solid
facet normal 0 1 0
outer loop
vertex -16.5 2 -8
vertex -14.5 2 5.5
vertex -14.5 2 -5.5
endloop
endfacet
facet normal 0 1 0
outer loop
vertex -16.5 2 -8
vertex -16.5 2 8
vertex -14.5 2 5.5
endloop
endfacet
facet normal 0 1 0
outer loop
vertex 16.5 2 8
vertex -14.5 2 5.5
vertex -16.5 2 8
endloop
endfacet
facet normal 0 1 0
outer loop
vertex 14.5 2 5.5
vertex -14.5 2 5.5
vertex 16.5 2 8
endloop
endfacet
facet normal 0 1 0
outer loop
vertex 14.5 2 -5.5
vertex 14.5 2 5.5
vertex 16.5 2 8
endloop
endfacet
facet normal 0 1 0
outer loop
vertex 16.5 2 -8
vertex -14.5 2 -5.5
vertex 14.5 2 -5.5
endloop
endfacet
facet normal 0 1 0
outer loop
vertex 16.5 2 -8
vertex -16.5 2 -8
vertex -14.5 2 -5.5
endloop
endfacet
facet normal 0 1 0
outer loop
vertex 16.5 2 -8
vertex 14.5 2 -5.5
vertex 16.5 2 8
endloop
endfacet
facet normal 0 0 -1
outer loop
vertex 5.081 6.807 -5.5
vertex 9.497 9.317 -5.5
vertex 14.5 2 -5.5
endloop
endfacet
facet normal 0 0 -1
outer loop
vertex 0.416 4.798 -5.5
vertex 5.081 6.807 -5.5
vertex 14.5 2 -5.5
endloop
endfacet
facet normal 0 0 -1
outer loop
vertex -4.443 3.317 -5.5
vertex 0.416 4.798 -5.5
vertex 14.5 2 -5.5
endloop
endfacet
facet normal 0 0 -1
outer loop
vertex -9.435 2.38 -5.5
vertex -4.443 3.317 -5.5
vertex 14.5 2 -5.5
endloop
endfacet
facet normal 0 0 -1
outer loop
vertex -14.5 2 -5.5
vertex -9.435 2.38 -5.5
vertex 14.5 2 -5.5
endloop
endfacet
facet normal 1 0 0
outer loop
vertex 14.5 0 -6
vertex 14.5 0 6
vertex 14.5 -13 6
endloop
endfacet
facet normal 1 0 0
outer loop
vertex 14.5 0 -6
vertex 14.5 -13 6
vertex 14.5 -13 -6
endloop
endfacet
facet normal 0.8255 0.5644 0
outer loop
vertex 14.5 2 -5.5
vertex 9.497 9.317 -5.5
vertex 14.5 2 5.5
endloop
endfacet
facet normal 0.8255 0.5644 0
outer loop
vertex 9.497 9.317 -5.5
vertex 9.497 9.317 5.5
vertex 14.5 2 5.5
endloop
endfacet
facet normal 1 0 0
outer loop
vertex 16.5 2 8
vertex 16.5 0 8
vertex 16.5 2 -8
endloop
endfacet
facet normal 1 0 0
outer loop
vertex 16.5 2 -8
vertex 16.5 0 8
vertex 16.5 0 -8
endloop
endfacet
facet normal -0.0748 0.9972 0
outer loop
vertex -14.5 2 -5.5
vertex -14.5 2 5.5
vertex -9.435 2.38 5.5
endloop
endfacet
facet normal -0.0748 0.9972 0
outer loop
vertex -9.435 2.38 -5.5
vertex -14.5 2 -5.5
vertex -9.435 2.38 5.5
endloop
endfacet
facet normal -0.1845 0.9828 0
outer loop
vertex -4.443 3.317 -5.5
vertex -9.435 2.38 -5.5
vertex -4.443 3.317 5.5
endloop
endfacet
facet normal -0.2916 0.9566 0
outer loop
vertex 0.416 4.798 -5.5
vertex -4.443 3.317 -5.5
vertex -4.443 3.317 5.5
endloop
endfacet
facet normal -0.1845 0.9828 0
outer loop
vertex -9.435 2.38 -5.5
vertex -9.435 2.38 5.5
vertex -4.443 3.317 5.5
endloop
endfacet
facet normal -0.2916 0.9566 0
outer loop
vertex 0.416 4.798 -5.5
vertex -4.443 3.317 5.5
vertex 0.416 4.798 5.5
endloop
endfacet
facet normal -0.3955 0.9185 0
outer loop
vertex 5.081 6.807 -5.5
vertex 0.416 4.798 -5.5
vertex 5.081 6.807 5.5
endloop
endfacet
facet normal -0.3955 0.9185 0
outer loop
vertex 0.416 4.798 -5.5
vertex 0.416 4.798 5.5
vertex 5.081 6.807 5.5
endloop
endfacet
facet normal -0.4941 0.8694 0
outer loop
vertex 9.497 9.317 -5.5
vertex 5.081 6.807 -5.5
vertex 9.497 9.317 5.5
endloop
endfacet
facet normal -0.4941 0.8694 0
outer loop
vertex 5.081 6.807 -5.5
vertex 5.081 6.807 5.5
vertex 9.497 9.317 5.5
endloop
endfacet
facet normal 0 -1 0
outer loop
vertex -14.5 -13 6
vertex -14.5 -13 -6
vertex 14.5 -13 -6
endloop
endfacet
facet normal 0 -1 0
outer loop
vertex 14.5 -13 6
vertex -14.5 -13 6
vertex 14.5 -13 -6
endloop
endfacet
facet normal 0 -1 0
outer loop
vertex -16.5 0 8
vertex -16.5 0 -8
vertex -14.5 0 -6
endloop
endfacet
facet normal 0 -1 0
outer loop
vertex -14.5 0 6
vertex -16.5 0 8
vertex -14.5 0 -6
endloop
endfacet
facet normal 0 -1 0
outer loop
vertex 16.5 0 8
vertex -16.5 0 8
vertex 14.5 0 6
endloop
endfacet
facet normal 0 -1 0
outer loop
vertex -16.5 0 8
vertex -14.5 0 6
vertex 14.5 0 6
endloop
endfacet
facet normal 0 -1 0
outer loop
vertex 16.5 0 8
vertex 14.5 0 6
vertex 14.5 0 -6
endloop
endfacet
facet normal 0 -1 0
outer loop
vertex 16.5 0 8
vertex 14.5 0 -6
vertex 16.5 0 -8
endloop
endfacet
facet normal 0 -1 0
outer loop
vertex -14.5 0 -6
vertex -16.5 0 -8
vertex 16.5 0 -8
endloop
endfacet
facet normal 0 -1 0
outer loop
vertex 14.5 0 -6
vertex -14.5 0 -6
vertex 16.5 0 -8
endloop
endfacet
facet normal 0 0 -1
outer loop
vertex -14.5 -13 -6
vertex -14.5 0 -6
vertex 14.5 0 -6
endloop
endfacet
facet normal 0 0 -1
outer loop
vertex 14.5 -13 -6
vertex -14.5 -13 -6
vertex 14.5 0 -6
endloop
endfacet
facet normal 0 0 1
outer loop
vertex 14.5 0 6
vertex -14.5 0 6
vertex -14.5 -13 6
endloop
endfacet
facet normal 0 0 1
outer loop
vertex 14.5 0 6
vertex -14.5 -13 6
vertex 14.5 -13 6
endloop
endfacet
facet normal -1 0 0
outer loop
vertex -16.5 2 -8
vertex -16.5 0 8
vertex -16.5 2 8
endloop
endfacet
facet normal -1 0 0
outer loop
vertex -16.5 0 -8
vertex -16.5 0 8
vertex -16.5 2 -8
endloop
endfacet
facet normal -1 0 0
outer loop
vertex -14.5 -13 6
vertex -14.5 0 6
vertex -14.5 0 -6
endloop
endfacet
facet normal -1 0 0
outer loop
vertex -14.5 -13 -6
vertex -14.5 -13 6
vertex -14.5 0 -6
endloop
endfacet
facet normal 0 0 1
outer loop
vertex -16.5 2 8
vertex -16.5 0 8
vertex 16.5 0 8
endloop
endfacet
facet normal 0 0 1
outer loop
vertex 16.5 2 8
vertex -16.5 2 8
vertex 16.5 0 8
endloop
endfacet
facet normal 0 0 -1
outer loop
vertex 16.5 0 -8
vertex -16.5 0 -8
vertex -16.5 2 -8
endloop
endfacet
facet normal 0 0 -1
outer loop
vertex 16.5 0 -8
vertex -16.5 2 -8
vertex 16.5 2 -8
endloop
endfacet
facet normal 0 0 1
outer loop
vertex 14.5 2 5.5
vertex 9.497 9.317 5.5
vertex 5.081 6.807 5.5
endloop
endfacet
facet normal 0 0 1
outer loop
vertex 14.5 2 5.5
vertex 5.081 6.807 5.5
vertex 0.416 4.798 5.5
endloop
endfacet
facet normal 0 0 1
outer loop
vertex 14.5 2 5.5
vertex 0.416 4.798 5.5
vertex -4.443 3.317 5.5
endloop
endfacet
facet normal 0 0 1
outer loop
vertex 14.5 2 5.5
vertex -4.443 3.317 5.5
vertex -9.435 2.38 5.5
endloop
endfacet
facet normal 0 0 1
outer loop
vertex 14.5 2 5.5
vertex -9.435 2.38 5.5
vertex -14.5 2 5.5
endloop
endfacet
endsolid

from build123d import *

# Parameters (mm, degrees)
SKETCH_1_W      = 33
SKETCH_1_H      = 16
EXTRUDE_1_DEPTH = 2
EXTRUDE_2_DEPTH = 5.5
SKETCH_3_W      = 29
SKETCH_3_H      = 12
EXTRUDE_3_DEPTH = 13


with BuildPart() as part:
    # 草图1 → 凸台-拉伸1 (new body)
    with BuildSketch(Plane(origin=(0, 0, 0), x_dir=(1, 0, 0), z_dir=(0, 1, 0))):
        Rectangle(SKETCH_1_W, SKETCH_1_H)
    extrude(amount=EXTRUDE_1_DEPTH)

    # 草图2 → 凸台-拉伸2 (add, symmetric)
    with BuildSketch(Plane.XY):
        with BuildLine():
            ThreePointArc((-14.5, 2), (-1.99286503, 3.990553371), (9.496887626, 9.317495439))
            Line((9.496887626, 9.317495439), (14.5, 2))
            Line((14.5, 2), (-14.5, 2))
        make_face()
    extrude(amount=EXTRUDE_2_DEPTH, both=True)

    # 草图3 → 凸台-拉伸3 (add)
    with BuildSketch(Plane(origin=(0, 0, 0), x_dir=(1, 0, 0), z_dir=(0, 1, 0))):
        Rectangle(SKETCH_3_W, SKETCH_3_H)
    extrude(amount=-EXTRUDE_3_DEPTH)


solid = part.part
